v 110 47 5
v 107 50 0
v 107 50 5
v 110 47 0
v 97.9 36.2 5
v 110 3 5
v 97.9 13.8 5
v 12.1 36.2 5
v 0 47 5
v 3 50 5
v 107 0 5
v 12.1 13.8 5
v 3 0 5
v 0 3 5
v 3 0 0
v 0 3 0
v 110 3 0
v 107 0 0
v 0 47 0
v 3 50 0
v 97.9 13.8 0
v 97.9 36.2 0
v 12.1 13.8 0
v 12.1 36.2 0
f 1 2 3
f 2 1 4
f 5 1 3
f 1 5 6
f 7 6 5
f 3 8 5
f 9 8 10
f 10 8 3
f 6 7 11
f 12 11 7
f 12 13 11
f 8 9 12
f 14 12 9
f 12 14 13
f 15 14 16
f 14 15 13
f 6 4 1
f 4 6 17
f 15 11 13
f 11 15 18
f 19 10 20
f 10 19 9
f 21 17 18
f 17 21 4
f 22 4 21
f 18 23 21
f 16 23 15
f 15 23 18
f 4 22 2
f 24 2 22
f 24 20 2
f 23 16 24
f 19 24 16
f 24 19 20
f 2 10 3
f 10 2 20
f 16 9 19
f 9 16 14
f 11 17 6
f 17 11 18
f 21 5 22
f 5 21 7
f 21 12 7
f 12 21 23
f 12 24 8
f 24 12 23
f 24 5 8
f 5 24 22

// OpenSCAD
$fn = 32;

// ----------------------------------------------------------------------
// Windowed plate: 1 voids, 110 x 50 x 5 mm
// ----------------------------------------------------------------------

// --- parameters (mm) ---
plate_l = 110;            // plate length, X
plate_w = 50;             // plate width, Y
plate_t = 5;              // plate thickness, Z
edge_margin = 8;          // wall from the plate edge to any window
win1_l = 85.8;            // window length
win1_w = 22.4;            // window width
depth_1 = 5;              // depth of void 1 (full thickness = through)
corner_c = 3;             // corner chamfer of the plate

profile = [[3, 0], [107, 0], [110, 3], [110, 47], [107, 50], [3, 50], [0, 47], [0, 3]];  // primary outline, 8 points, counter clockwise
void_1 = [[12.1, 13.8], [97.9, 13.8], [97.9, 36.2], [12.1, 36.2]];  // large central window, 4 points

// --- the one profile operation ---
difference() {
  linear_extrude(height = plate_t) polygon(points = profile);
  translate([0, 0, -1])
    linear_extrude(height = plate_t + 2) polygon(points = void_1);
}
